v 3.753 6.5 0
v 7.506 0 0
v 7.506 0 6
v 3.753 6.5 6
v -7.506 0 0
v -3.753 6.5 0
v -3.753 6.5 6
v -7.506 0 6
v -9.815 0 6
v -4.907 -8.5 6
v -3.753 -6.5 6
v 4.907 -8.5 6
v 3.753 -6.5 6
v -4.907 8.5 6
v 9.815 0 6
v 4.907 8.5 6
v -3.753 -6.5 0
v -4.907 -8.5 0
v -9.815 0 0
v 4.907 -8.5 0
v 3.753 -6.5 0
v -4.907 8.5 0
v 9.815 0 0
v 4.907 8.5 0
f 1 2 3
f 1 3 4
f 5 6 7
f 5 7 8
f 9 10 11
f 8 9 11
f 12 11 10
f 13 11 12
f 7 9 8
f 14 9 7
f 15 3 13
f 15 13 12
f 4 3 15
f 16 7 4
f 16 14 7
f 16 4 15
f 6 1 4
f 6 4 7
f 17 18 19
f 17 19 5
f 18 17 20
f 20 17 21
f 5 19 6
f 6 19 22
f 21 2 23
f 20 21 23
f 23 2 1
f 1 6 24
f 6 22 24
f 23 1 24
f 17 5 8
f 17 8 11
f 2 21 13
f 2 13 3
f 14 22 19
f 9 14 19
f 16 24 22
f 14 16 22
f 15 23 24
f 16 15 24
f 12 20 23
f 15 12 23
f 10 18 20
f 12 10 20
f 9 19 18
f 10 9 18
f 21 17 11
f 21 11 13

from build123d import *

# Parameters (mm, degrees)
PAD_DEPTH = 6


with BuildPart() as part:
    # Sketch → Pad (new body)
    with BuildSketch(Plane.XY):
        Polygon((9.814955, 0), (4.907477, 8.5), (-4.907477, 8.5), (-9.814955, 0), (-4.907477, -8.5), (4.907477, -8.5), align=None)
        Polygon((7.505553, 0), (3.752777, 6.5), (-3.752777, 6.5), (-7.505553, 0), (-3.752777, -6.5), (3.752777, -6.5), align=None, mode=Mode.SUBTRACT)
    extrude(amount=PAD_DEPTH)


solid = part.part
